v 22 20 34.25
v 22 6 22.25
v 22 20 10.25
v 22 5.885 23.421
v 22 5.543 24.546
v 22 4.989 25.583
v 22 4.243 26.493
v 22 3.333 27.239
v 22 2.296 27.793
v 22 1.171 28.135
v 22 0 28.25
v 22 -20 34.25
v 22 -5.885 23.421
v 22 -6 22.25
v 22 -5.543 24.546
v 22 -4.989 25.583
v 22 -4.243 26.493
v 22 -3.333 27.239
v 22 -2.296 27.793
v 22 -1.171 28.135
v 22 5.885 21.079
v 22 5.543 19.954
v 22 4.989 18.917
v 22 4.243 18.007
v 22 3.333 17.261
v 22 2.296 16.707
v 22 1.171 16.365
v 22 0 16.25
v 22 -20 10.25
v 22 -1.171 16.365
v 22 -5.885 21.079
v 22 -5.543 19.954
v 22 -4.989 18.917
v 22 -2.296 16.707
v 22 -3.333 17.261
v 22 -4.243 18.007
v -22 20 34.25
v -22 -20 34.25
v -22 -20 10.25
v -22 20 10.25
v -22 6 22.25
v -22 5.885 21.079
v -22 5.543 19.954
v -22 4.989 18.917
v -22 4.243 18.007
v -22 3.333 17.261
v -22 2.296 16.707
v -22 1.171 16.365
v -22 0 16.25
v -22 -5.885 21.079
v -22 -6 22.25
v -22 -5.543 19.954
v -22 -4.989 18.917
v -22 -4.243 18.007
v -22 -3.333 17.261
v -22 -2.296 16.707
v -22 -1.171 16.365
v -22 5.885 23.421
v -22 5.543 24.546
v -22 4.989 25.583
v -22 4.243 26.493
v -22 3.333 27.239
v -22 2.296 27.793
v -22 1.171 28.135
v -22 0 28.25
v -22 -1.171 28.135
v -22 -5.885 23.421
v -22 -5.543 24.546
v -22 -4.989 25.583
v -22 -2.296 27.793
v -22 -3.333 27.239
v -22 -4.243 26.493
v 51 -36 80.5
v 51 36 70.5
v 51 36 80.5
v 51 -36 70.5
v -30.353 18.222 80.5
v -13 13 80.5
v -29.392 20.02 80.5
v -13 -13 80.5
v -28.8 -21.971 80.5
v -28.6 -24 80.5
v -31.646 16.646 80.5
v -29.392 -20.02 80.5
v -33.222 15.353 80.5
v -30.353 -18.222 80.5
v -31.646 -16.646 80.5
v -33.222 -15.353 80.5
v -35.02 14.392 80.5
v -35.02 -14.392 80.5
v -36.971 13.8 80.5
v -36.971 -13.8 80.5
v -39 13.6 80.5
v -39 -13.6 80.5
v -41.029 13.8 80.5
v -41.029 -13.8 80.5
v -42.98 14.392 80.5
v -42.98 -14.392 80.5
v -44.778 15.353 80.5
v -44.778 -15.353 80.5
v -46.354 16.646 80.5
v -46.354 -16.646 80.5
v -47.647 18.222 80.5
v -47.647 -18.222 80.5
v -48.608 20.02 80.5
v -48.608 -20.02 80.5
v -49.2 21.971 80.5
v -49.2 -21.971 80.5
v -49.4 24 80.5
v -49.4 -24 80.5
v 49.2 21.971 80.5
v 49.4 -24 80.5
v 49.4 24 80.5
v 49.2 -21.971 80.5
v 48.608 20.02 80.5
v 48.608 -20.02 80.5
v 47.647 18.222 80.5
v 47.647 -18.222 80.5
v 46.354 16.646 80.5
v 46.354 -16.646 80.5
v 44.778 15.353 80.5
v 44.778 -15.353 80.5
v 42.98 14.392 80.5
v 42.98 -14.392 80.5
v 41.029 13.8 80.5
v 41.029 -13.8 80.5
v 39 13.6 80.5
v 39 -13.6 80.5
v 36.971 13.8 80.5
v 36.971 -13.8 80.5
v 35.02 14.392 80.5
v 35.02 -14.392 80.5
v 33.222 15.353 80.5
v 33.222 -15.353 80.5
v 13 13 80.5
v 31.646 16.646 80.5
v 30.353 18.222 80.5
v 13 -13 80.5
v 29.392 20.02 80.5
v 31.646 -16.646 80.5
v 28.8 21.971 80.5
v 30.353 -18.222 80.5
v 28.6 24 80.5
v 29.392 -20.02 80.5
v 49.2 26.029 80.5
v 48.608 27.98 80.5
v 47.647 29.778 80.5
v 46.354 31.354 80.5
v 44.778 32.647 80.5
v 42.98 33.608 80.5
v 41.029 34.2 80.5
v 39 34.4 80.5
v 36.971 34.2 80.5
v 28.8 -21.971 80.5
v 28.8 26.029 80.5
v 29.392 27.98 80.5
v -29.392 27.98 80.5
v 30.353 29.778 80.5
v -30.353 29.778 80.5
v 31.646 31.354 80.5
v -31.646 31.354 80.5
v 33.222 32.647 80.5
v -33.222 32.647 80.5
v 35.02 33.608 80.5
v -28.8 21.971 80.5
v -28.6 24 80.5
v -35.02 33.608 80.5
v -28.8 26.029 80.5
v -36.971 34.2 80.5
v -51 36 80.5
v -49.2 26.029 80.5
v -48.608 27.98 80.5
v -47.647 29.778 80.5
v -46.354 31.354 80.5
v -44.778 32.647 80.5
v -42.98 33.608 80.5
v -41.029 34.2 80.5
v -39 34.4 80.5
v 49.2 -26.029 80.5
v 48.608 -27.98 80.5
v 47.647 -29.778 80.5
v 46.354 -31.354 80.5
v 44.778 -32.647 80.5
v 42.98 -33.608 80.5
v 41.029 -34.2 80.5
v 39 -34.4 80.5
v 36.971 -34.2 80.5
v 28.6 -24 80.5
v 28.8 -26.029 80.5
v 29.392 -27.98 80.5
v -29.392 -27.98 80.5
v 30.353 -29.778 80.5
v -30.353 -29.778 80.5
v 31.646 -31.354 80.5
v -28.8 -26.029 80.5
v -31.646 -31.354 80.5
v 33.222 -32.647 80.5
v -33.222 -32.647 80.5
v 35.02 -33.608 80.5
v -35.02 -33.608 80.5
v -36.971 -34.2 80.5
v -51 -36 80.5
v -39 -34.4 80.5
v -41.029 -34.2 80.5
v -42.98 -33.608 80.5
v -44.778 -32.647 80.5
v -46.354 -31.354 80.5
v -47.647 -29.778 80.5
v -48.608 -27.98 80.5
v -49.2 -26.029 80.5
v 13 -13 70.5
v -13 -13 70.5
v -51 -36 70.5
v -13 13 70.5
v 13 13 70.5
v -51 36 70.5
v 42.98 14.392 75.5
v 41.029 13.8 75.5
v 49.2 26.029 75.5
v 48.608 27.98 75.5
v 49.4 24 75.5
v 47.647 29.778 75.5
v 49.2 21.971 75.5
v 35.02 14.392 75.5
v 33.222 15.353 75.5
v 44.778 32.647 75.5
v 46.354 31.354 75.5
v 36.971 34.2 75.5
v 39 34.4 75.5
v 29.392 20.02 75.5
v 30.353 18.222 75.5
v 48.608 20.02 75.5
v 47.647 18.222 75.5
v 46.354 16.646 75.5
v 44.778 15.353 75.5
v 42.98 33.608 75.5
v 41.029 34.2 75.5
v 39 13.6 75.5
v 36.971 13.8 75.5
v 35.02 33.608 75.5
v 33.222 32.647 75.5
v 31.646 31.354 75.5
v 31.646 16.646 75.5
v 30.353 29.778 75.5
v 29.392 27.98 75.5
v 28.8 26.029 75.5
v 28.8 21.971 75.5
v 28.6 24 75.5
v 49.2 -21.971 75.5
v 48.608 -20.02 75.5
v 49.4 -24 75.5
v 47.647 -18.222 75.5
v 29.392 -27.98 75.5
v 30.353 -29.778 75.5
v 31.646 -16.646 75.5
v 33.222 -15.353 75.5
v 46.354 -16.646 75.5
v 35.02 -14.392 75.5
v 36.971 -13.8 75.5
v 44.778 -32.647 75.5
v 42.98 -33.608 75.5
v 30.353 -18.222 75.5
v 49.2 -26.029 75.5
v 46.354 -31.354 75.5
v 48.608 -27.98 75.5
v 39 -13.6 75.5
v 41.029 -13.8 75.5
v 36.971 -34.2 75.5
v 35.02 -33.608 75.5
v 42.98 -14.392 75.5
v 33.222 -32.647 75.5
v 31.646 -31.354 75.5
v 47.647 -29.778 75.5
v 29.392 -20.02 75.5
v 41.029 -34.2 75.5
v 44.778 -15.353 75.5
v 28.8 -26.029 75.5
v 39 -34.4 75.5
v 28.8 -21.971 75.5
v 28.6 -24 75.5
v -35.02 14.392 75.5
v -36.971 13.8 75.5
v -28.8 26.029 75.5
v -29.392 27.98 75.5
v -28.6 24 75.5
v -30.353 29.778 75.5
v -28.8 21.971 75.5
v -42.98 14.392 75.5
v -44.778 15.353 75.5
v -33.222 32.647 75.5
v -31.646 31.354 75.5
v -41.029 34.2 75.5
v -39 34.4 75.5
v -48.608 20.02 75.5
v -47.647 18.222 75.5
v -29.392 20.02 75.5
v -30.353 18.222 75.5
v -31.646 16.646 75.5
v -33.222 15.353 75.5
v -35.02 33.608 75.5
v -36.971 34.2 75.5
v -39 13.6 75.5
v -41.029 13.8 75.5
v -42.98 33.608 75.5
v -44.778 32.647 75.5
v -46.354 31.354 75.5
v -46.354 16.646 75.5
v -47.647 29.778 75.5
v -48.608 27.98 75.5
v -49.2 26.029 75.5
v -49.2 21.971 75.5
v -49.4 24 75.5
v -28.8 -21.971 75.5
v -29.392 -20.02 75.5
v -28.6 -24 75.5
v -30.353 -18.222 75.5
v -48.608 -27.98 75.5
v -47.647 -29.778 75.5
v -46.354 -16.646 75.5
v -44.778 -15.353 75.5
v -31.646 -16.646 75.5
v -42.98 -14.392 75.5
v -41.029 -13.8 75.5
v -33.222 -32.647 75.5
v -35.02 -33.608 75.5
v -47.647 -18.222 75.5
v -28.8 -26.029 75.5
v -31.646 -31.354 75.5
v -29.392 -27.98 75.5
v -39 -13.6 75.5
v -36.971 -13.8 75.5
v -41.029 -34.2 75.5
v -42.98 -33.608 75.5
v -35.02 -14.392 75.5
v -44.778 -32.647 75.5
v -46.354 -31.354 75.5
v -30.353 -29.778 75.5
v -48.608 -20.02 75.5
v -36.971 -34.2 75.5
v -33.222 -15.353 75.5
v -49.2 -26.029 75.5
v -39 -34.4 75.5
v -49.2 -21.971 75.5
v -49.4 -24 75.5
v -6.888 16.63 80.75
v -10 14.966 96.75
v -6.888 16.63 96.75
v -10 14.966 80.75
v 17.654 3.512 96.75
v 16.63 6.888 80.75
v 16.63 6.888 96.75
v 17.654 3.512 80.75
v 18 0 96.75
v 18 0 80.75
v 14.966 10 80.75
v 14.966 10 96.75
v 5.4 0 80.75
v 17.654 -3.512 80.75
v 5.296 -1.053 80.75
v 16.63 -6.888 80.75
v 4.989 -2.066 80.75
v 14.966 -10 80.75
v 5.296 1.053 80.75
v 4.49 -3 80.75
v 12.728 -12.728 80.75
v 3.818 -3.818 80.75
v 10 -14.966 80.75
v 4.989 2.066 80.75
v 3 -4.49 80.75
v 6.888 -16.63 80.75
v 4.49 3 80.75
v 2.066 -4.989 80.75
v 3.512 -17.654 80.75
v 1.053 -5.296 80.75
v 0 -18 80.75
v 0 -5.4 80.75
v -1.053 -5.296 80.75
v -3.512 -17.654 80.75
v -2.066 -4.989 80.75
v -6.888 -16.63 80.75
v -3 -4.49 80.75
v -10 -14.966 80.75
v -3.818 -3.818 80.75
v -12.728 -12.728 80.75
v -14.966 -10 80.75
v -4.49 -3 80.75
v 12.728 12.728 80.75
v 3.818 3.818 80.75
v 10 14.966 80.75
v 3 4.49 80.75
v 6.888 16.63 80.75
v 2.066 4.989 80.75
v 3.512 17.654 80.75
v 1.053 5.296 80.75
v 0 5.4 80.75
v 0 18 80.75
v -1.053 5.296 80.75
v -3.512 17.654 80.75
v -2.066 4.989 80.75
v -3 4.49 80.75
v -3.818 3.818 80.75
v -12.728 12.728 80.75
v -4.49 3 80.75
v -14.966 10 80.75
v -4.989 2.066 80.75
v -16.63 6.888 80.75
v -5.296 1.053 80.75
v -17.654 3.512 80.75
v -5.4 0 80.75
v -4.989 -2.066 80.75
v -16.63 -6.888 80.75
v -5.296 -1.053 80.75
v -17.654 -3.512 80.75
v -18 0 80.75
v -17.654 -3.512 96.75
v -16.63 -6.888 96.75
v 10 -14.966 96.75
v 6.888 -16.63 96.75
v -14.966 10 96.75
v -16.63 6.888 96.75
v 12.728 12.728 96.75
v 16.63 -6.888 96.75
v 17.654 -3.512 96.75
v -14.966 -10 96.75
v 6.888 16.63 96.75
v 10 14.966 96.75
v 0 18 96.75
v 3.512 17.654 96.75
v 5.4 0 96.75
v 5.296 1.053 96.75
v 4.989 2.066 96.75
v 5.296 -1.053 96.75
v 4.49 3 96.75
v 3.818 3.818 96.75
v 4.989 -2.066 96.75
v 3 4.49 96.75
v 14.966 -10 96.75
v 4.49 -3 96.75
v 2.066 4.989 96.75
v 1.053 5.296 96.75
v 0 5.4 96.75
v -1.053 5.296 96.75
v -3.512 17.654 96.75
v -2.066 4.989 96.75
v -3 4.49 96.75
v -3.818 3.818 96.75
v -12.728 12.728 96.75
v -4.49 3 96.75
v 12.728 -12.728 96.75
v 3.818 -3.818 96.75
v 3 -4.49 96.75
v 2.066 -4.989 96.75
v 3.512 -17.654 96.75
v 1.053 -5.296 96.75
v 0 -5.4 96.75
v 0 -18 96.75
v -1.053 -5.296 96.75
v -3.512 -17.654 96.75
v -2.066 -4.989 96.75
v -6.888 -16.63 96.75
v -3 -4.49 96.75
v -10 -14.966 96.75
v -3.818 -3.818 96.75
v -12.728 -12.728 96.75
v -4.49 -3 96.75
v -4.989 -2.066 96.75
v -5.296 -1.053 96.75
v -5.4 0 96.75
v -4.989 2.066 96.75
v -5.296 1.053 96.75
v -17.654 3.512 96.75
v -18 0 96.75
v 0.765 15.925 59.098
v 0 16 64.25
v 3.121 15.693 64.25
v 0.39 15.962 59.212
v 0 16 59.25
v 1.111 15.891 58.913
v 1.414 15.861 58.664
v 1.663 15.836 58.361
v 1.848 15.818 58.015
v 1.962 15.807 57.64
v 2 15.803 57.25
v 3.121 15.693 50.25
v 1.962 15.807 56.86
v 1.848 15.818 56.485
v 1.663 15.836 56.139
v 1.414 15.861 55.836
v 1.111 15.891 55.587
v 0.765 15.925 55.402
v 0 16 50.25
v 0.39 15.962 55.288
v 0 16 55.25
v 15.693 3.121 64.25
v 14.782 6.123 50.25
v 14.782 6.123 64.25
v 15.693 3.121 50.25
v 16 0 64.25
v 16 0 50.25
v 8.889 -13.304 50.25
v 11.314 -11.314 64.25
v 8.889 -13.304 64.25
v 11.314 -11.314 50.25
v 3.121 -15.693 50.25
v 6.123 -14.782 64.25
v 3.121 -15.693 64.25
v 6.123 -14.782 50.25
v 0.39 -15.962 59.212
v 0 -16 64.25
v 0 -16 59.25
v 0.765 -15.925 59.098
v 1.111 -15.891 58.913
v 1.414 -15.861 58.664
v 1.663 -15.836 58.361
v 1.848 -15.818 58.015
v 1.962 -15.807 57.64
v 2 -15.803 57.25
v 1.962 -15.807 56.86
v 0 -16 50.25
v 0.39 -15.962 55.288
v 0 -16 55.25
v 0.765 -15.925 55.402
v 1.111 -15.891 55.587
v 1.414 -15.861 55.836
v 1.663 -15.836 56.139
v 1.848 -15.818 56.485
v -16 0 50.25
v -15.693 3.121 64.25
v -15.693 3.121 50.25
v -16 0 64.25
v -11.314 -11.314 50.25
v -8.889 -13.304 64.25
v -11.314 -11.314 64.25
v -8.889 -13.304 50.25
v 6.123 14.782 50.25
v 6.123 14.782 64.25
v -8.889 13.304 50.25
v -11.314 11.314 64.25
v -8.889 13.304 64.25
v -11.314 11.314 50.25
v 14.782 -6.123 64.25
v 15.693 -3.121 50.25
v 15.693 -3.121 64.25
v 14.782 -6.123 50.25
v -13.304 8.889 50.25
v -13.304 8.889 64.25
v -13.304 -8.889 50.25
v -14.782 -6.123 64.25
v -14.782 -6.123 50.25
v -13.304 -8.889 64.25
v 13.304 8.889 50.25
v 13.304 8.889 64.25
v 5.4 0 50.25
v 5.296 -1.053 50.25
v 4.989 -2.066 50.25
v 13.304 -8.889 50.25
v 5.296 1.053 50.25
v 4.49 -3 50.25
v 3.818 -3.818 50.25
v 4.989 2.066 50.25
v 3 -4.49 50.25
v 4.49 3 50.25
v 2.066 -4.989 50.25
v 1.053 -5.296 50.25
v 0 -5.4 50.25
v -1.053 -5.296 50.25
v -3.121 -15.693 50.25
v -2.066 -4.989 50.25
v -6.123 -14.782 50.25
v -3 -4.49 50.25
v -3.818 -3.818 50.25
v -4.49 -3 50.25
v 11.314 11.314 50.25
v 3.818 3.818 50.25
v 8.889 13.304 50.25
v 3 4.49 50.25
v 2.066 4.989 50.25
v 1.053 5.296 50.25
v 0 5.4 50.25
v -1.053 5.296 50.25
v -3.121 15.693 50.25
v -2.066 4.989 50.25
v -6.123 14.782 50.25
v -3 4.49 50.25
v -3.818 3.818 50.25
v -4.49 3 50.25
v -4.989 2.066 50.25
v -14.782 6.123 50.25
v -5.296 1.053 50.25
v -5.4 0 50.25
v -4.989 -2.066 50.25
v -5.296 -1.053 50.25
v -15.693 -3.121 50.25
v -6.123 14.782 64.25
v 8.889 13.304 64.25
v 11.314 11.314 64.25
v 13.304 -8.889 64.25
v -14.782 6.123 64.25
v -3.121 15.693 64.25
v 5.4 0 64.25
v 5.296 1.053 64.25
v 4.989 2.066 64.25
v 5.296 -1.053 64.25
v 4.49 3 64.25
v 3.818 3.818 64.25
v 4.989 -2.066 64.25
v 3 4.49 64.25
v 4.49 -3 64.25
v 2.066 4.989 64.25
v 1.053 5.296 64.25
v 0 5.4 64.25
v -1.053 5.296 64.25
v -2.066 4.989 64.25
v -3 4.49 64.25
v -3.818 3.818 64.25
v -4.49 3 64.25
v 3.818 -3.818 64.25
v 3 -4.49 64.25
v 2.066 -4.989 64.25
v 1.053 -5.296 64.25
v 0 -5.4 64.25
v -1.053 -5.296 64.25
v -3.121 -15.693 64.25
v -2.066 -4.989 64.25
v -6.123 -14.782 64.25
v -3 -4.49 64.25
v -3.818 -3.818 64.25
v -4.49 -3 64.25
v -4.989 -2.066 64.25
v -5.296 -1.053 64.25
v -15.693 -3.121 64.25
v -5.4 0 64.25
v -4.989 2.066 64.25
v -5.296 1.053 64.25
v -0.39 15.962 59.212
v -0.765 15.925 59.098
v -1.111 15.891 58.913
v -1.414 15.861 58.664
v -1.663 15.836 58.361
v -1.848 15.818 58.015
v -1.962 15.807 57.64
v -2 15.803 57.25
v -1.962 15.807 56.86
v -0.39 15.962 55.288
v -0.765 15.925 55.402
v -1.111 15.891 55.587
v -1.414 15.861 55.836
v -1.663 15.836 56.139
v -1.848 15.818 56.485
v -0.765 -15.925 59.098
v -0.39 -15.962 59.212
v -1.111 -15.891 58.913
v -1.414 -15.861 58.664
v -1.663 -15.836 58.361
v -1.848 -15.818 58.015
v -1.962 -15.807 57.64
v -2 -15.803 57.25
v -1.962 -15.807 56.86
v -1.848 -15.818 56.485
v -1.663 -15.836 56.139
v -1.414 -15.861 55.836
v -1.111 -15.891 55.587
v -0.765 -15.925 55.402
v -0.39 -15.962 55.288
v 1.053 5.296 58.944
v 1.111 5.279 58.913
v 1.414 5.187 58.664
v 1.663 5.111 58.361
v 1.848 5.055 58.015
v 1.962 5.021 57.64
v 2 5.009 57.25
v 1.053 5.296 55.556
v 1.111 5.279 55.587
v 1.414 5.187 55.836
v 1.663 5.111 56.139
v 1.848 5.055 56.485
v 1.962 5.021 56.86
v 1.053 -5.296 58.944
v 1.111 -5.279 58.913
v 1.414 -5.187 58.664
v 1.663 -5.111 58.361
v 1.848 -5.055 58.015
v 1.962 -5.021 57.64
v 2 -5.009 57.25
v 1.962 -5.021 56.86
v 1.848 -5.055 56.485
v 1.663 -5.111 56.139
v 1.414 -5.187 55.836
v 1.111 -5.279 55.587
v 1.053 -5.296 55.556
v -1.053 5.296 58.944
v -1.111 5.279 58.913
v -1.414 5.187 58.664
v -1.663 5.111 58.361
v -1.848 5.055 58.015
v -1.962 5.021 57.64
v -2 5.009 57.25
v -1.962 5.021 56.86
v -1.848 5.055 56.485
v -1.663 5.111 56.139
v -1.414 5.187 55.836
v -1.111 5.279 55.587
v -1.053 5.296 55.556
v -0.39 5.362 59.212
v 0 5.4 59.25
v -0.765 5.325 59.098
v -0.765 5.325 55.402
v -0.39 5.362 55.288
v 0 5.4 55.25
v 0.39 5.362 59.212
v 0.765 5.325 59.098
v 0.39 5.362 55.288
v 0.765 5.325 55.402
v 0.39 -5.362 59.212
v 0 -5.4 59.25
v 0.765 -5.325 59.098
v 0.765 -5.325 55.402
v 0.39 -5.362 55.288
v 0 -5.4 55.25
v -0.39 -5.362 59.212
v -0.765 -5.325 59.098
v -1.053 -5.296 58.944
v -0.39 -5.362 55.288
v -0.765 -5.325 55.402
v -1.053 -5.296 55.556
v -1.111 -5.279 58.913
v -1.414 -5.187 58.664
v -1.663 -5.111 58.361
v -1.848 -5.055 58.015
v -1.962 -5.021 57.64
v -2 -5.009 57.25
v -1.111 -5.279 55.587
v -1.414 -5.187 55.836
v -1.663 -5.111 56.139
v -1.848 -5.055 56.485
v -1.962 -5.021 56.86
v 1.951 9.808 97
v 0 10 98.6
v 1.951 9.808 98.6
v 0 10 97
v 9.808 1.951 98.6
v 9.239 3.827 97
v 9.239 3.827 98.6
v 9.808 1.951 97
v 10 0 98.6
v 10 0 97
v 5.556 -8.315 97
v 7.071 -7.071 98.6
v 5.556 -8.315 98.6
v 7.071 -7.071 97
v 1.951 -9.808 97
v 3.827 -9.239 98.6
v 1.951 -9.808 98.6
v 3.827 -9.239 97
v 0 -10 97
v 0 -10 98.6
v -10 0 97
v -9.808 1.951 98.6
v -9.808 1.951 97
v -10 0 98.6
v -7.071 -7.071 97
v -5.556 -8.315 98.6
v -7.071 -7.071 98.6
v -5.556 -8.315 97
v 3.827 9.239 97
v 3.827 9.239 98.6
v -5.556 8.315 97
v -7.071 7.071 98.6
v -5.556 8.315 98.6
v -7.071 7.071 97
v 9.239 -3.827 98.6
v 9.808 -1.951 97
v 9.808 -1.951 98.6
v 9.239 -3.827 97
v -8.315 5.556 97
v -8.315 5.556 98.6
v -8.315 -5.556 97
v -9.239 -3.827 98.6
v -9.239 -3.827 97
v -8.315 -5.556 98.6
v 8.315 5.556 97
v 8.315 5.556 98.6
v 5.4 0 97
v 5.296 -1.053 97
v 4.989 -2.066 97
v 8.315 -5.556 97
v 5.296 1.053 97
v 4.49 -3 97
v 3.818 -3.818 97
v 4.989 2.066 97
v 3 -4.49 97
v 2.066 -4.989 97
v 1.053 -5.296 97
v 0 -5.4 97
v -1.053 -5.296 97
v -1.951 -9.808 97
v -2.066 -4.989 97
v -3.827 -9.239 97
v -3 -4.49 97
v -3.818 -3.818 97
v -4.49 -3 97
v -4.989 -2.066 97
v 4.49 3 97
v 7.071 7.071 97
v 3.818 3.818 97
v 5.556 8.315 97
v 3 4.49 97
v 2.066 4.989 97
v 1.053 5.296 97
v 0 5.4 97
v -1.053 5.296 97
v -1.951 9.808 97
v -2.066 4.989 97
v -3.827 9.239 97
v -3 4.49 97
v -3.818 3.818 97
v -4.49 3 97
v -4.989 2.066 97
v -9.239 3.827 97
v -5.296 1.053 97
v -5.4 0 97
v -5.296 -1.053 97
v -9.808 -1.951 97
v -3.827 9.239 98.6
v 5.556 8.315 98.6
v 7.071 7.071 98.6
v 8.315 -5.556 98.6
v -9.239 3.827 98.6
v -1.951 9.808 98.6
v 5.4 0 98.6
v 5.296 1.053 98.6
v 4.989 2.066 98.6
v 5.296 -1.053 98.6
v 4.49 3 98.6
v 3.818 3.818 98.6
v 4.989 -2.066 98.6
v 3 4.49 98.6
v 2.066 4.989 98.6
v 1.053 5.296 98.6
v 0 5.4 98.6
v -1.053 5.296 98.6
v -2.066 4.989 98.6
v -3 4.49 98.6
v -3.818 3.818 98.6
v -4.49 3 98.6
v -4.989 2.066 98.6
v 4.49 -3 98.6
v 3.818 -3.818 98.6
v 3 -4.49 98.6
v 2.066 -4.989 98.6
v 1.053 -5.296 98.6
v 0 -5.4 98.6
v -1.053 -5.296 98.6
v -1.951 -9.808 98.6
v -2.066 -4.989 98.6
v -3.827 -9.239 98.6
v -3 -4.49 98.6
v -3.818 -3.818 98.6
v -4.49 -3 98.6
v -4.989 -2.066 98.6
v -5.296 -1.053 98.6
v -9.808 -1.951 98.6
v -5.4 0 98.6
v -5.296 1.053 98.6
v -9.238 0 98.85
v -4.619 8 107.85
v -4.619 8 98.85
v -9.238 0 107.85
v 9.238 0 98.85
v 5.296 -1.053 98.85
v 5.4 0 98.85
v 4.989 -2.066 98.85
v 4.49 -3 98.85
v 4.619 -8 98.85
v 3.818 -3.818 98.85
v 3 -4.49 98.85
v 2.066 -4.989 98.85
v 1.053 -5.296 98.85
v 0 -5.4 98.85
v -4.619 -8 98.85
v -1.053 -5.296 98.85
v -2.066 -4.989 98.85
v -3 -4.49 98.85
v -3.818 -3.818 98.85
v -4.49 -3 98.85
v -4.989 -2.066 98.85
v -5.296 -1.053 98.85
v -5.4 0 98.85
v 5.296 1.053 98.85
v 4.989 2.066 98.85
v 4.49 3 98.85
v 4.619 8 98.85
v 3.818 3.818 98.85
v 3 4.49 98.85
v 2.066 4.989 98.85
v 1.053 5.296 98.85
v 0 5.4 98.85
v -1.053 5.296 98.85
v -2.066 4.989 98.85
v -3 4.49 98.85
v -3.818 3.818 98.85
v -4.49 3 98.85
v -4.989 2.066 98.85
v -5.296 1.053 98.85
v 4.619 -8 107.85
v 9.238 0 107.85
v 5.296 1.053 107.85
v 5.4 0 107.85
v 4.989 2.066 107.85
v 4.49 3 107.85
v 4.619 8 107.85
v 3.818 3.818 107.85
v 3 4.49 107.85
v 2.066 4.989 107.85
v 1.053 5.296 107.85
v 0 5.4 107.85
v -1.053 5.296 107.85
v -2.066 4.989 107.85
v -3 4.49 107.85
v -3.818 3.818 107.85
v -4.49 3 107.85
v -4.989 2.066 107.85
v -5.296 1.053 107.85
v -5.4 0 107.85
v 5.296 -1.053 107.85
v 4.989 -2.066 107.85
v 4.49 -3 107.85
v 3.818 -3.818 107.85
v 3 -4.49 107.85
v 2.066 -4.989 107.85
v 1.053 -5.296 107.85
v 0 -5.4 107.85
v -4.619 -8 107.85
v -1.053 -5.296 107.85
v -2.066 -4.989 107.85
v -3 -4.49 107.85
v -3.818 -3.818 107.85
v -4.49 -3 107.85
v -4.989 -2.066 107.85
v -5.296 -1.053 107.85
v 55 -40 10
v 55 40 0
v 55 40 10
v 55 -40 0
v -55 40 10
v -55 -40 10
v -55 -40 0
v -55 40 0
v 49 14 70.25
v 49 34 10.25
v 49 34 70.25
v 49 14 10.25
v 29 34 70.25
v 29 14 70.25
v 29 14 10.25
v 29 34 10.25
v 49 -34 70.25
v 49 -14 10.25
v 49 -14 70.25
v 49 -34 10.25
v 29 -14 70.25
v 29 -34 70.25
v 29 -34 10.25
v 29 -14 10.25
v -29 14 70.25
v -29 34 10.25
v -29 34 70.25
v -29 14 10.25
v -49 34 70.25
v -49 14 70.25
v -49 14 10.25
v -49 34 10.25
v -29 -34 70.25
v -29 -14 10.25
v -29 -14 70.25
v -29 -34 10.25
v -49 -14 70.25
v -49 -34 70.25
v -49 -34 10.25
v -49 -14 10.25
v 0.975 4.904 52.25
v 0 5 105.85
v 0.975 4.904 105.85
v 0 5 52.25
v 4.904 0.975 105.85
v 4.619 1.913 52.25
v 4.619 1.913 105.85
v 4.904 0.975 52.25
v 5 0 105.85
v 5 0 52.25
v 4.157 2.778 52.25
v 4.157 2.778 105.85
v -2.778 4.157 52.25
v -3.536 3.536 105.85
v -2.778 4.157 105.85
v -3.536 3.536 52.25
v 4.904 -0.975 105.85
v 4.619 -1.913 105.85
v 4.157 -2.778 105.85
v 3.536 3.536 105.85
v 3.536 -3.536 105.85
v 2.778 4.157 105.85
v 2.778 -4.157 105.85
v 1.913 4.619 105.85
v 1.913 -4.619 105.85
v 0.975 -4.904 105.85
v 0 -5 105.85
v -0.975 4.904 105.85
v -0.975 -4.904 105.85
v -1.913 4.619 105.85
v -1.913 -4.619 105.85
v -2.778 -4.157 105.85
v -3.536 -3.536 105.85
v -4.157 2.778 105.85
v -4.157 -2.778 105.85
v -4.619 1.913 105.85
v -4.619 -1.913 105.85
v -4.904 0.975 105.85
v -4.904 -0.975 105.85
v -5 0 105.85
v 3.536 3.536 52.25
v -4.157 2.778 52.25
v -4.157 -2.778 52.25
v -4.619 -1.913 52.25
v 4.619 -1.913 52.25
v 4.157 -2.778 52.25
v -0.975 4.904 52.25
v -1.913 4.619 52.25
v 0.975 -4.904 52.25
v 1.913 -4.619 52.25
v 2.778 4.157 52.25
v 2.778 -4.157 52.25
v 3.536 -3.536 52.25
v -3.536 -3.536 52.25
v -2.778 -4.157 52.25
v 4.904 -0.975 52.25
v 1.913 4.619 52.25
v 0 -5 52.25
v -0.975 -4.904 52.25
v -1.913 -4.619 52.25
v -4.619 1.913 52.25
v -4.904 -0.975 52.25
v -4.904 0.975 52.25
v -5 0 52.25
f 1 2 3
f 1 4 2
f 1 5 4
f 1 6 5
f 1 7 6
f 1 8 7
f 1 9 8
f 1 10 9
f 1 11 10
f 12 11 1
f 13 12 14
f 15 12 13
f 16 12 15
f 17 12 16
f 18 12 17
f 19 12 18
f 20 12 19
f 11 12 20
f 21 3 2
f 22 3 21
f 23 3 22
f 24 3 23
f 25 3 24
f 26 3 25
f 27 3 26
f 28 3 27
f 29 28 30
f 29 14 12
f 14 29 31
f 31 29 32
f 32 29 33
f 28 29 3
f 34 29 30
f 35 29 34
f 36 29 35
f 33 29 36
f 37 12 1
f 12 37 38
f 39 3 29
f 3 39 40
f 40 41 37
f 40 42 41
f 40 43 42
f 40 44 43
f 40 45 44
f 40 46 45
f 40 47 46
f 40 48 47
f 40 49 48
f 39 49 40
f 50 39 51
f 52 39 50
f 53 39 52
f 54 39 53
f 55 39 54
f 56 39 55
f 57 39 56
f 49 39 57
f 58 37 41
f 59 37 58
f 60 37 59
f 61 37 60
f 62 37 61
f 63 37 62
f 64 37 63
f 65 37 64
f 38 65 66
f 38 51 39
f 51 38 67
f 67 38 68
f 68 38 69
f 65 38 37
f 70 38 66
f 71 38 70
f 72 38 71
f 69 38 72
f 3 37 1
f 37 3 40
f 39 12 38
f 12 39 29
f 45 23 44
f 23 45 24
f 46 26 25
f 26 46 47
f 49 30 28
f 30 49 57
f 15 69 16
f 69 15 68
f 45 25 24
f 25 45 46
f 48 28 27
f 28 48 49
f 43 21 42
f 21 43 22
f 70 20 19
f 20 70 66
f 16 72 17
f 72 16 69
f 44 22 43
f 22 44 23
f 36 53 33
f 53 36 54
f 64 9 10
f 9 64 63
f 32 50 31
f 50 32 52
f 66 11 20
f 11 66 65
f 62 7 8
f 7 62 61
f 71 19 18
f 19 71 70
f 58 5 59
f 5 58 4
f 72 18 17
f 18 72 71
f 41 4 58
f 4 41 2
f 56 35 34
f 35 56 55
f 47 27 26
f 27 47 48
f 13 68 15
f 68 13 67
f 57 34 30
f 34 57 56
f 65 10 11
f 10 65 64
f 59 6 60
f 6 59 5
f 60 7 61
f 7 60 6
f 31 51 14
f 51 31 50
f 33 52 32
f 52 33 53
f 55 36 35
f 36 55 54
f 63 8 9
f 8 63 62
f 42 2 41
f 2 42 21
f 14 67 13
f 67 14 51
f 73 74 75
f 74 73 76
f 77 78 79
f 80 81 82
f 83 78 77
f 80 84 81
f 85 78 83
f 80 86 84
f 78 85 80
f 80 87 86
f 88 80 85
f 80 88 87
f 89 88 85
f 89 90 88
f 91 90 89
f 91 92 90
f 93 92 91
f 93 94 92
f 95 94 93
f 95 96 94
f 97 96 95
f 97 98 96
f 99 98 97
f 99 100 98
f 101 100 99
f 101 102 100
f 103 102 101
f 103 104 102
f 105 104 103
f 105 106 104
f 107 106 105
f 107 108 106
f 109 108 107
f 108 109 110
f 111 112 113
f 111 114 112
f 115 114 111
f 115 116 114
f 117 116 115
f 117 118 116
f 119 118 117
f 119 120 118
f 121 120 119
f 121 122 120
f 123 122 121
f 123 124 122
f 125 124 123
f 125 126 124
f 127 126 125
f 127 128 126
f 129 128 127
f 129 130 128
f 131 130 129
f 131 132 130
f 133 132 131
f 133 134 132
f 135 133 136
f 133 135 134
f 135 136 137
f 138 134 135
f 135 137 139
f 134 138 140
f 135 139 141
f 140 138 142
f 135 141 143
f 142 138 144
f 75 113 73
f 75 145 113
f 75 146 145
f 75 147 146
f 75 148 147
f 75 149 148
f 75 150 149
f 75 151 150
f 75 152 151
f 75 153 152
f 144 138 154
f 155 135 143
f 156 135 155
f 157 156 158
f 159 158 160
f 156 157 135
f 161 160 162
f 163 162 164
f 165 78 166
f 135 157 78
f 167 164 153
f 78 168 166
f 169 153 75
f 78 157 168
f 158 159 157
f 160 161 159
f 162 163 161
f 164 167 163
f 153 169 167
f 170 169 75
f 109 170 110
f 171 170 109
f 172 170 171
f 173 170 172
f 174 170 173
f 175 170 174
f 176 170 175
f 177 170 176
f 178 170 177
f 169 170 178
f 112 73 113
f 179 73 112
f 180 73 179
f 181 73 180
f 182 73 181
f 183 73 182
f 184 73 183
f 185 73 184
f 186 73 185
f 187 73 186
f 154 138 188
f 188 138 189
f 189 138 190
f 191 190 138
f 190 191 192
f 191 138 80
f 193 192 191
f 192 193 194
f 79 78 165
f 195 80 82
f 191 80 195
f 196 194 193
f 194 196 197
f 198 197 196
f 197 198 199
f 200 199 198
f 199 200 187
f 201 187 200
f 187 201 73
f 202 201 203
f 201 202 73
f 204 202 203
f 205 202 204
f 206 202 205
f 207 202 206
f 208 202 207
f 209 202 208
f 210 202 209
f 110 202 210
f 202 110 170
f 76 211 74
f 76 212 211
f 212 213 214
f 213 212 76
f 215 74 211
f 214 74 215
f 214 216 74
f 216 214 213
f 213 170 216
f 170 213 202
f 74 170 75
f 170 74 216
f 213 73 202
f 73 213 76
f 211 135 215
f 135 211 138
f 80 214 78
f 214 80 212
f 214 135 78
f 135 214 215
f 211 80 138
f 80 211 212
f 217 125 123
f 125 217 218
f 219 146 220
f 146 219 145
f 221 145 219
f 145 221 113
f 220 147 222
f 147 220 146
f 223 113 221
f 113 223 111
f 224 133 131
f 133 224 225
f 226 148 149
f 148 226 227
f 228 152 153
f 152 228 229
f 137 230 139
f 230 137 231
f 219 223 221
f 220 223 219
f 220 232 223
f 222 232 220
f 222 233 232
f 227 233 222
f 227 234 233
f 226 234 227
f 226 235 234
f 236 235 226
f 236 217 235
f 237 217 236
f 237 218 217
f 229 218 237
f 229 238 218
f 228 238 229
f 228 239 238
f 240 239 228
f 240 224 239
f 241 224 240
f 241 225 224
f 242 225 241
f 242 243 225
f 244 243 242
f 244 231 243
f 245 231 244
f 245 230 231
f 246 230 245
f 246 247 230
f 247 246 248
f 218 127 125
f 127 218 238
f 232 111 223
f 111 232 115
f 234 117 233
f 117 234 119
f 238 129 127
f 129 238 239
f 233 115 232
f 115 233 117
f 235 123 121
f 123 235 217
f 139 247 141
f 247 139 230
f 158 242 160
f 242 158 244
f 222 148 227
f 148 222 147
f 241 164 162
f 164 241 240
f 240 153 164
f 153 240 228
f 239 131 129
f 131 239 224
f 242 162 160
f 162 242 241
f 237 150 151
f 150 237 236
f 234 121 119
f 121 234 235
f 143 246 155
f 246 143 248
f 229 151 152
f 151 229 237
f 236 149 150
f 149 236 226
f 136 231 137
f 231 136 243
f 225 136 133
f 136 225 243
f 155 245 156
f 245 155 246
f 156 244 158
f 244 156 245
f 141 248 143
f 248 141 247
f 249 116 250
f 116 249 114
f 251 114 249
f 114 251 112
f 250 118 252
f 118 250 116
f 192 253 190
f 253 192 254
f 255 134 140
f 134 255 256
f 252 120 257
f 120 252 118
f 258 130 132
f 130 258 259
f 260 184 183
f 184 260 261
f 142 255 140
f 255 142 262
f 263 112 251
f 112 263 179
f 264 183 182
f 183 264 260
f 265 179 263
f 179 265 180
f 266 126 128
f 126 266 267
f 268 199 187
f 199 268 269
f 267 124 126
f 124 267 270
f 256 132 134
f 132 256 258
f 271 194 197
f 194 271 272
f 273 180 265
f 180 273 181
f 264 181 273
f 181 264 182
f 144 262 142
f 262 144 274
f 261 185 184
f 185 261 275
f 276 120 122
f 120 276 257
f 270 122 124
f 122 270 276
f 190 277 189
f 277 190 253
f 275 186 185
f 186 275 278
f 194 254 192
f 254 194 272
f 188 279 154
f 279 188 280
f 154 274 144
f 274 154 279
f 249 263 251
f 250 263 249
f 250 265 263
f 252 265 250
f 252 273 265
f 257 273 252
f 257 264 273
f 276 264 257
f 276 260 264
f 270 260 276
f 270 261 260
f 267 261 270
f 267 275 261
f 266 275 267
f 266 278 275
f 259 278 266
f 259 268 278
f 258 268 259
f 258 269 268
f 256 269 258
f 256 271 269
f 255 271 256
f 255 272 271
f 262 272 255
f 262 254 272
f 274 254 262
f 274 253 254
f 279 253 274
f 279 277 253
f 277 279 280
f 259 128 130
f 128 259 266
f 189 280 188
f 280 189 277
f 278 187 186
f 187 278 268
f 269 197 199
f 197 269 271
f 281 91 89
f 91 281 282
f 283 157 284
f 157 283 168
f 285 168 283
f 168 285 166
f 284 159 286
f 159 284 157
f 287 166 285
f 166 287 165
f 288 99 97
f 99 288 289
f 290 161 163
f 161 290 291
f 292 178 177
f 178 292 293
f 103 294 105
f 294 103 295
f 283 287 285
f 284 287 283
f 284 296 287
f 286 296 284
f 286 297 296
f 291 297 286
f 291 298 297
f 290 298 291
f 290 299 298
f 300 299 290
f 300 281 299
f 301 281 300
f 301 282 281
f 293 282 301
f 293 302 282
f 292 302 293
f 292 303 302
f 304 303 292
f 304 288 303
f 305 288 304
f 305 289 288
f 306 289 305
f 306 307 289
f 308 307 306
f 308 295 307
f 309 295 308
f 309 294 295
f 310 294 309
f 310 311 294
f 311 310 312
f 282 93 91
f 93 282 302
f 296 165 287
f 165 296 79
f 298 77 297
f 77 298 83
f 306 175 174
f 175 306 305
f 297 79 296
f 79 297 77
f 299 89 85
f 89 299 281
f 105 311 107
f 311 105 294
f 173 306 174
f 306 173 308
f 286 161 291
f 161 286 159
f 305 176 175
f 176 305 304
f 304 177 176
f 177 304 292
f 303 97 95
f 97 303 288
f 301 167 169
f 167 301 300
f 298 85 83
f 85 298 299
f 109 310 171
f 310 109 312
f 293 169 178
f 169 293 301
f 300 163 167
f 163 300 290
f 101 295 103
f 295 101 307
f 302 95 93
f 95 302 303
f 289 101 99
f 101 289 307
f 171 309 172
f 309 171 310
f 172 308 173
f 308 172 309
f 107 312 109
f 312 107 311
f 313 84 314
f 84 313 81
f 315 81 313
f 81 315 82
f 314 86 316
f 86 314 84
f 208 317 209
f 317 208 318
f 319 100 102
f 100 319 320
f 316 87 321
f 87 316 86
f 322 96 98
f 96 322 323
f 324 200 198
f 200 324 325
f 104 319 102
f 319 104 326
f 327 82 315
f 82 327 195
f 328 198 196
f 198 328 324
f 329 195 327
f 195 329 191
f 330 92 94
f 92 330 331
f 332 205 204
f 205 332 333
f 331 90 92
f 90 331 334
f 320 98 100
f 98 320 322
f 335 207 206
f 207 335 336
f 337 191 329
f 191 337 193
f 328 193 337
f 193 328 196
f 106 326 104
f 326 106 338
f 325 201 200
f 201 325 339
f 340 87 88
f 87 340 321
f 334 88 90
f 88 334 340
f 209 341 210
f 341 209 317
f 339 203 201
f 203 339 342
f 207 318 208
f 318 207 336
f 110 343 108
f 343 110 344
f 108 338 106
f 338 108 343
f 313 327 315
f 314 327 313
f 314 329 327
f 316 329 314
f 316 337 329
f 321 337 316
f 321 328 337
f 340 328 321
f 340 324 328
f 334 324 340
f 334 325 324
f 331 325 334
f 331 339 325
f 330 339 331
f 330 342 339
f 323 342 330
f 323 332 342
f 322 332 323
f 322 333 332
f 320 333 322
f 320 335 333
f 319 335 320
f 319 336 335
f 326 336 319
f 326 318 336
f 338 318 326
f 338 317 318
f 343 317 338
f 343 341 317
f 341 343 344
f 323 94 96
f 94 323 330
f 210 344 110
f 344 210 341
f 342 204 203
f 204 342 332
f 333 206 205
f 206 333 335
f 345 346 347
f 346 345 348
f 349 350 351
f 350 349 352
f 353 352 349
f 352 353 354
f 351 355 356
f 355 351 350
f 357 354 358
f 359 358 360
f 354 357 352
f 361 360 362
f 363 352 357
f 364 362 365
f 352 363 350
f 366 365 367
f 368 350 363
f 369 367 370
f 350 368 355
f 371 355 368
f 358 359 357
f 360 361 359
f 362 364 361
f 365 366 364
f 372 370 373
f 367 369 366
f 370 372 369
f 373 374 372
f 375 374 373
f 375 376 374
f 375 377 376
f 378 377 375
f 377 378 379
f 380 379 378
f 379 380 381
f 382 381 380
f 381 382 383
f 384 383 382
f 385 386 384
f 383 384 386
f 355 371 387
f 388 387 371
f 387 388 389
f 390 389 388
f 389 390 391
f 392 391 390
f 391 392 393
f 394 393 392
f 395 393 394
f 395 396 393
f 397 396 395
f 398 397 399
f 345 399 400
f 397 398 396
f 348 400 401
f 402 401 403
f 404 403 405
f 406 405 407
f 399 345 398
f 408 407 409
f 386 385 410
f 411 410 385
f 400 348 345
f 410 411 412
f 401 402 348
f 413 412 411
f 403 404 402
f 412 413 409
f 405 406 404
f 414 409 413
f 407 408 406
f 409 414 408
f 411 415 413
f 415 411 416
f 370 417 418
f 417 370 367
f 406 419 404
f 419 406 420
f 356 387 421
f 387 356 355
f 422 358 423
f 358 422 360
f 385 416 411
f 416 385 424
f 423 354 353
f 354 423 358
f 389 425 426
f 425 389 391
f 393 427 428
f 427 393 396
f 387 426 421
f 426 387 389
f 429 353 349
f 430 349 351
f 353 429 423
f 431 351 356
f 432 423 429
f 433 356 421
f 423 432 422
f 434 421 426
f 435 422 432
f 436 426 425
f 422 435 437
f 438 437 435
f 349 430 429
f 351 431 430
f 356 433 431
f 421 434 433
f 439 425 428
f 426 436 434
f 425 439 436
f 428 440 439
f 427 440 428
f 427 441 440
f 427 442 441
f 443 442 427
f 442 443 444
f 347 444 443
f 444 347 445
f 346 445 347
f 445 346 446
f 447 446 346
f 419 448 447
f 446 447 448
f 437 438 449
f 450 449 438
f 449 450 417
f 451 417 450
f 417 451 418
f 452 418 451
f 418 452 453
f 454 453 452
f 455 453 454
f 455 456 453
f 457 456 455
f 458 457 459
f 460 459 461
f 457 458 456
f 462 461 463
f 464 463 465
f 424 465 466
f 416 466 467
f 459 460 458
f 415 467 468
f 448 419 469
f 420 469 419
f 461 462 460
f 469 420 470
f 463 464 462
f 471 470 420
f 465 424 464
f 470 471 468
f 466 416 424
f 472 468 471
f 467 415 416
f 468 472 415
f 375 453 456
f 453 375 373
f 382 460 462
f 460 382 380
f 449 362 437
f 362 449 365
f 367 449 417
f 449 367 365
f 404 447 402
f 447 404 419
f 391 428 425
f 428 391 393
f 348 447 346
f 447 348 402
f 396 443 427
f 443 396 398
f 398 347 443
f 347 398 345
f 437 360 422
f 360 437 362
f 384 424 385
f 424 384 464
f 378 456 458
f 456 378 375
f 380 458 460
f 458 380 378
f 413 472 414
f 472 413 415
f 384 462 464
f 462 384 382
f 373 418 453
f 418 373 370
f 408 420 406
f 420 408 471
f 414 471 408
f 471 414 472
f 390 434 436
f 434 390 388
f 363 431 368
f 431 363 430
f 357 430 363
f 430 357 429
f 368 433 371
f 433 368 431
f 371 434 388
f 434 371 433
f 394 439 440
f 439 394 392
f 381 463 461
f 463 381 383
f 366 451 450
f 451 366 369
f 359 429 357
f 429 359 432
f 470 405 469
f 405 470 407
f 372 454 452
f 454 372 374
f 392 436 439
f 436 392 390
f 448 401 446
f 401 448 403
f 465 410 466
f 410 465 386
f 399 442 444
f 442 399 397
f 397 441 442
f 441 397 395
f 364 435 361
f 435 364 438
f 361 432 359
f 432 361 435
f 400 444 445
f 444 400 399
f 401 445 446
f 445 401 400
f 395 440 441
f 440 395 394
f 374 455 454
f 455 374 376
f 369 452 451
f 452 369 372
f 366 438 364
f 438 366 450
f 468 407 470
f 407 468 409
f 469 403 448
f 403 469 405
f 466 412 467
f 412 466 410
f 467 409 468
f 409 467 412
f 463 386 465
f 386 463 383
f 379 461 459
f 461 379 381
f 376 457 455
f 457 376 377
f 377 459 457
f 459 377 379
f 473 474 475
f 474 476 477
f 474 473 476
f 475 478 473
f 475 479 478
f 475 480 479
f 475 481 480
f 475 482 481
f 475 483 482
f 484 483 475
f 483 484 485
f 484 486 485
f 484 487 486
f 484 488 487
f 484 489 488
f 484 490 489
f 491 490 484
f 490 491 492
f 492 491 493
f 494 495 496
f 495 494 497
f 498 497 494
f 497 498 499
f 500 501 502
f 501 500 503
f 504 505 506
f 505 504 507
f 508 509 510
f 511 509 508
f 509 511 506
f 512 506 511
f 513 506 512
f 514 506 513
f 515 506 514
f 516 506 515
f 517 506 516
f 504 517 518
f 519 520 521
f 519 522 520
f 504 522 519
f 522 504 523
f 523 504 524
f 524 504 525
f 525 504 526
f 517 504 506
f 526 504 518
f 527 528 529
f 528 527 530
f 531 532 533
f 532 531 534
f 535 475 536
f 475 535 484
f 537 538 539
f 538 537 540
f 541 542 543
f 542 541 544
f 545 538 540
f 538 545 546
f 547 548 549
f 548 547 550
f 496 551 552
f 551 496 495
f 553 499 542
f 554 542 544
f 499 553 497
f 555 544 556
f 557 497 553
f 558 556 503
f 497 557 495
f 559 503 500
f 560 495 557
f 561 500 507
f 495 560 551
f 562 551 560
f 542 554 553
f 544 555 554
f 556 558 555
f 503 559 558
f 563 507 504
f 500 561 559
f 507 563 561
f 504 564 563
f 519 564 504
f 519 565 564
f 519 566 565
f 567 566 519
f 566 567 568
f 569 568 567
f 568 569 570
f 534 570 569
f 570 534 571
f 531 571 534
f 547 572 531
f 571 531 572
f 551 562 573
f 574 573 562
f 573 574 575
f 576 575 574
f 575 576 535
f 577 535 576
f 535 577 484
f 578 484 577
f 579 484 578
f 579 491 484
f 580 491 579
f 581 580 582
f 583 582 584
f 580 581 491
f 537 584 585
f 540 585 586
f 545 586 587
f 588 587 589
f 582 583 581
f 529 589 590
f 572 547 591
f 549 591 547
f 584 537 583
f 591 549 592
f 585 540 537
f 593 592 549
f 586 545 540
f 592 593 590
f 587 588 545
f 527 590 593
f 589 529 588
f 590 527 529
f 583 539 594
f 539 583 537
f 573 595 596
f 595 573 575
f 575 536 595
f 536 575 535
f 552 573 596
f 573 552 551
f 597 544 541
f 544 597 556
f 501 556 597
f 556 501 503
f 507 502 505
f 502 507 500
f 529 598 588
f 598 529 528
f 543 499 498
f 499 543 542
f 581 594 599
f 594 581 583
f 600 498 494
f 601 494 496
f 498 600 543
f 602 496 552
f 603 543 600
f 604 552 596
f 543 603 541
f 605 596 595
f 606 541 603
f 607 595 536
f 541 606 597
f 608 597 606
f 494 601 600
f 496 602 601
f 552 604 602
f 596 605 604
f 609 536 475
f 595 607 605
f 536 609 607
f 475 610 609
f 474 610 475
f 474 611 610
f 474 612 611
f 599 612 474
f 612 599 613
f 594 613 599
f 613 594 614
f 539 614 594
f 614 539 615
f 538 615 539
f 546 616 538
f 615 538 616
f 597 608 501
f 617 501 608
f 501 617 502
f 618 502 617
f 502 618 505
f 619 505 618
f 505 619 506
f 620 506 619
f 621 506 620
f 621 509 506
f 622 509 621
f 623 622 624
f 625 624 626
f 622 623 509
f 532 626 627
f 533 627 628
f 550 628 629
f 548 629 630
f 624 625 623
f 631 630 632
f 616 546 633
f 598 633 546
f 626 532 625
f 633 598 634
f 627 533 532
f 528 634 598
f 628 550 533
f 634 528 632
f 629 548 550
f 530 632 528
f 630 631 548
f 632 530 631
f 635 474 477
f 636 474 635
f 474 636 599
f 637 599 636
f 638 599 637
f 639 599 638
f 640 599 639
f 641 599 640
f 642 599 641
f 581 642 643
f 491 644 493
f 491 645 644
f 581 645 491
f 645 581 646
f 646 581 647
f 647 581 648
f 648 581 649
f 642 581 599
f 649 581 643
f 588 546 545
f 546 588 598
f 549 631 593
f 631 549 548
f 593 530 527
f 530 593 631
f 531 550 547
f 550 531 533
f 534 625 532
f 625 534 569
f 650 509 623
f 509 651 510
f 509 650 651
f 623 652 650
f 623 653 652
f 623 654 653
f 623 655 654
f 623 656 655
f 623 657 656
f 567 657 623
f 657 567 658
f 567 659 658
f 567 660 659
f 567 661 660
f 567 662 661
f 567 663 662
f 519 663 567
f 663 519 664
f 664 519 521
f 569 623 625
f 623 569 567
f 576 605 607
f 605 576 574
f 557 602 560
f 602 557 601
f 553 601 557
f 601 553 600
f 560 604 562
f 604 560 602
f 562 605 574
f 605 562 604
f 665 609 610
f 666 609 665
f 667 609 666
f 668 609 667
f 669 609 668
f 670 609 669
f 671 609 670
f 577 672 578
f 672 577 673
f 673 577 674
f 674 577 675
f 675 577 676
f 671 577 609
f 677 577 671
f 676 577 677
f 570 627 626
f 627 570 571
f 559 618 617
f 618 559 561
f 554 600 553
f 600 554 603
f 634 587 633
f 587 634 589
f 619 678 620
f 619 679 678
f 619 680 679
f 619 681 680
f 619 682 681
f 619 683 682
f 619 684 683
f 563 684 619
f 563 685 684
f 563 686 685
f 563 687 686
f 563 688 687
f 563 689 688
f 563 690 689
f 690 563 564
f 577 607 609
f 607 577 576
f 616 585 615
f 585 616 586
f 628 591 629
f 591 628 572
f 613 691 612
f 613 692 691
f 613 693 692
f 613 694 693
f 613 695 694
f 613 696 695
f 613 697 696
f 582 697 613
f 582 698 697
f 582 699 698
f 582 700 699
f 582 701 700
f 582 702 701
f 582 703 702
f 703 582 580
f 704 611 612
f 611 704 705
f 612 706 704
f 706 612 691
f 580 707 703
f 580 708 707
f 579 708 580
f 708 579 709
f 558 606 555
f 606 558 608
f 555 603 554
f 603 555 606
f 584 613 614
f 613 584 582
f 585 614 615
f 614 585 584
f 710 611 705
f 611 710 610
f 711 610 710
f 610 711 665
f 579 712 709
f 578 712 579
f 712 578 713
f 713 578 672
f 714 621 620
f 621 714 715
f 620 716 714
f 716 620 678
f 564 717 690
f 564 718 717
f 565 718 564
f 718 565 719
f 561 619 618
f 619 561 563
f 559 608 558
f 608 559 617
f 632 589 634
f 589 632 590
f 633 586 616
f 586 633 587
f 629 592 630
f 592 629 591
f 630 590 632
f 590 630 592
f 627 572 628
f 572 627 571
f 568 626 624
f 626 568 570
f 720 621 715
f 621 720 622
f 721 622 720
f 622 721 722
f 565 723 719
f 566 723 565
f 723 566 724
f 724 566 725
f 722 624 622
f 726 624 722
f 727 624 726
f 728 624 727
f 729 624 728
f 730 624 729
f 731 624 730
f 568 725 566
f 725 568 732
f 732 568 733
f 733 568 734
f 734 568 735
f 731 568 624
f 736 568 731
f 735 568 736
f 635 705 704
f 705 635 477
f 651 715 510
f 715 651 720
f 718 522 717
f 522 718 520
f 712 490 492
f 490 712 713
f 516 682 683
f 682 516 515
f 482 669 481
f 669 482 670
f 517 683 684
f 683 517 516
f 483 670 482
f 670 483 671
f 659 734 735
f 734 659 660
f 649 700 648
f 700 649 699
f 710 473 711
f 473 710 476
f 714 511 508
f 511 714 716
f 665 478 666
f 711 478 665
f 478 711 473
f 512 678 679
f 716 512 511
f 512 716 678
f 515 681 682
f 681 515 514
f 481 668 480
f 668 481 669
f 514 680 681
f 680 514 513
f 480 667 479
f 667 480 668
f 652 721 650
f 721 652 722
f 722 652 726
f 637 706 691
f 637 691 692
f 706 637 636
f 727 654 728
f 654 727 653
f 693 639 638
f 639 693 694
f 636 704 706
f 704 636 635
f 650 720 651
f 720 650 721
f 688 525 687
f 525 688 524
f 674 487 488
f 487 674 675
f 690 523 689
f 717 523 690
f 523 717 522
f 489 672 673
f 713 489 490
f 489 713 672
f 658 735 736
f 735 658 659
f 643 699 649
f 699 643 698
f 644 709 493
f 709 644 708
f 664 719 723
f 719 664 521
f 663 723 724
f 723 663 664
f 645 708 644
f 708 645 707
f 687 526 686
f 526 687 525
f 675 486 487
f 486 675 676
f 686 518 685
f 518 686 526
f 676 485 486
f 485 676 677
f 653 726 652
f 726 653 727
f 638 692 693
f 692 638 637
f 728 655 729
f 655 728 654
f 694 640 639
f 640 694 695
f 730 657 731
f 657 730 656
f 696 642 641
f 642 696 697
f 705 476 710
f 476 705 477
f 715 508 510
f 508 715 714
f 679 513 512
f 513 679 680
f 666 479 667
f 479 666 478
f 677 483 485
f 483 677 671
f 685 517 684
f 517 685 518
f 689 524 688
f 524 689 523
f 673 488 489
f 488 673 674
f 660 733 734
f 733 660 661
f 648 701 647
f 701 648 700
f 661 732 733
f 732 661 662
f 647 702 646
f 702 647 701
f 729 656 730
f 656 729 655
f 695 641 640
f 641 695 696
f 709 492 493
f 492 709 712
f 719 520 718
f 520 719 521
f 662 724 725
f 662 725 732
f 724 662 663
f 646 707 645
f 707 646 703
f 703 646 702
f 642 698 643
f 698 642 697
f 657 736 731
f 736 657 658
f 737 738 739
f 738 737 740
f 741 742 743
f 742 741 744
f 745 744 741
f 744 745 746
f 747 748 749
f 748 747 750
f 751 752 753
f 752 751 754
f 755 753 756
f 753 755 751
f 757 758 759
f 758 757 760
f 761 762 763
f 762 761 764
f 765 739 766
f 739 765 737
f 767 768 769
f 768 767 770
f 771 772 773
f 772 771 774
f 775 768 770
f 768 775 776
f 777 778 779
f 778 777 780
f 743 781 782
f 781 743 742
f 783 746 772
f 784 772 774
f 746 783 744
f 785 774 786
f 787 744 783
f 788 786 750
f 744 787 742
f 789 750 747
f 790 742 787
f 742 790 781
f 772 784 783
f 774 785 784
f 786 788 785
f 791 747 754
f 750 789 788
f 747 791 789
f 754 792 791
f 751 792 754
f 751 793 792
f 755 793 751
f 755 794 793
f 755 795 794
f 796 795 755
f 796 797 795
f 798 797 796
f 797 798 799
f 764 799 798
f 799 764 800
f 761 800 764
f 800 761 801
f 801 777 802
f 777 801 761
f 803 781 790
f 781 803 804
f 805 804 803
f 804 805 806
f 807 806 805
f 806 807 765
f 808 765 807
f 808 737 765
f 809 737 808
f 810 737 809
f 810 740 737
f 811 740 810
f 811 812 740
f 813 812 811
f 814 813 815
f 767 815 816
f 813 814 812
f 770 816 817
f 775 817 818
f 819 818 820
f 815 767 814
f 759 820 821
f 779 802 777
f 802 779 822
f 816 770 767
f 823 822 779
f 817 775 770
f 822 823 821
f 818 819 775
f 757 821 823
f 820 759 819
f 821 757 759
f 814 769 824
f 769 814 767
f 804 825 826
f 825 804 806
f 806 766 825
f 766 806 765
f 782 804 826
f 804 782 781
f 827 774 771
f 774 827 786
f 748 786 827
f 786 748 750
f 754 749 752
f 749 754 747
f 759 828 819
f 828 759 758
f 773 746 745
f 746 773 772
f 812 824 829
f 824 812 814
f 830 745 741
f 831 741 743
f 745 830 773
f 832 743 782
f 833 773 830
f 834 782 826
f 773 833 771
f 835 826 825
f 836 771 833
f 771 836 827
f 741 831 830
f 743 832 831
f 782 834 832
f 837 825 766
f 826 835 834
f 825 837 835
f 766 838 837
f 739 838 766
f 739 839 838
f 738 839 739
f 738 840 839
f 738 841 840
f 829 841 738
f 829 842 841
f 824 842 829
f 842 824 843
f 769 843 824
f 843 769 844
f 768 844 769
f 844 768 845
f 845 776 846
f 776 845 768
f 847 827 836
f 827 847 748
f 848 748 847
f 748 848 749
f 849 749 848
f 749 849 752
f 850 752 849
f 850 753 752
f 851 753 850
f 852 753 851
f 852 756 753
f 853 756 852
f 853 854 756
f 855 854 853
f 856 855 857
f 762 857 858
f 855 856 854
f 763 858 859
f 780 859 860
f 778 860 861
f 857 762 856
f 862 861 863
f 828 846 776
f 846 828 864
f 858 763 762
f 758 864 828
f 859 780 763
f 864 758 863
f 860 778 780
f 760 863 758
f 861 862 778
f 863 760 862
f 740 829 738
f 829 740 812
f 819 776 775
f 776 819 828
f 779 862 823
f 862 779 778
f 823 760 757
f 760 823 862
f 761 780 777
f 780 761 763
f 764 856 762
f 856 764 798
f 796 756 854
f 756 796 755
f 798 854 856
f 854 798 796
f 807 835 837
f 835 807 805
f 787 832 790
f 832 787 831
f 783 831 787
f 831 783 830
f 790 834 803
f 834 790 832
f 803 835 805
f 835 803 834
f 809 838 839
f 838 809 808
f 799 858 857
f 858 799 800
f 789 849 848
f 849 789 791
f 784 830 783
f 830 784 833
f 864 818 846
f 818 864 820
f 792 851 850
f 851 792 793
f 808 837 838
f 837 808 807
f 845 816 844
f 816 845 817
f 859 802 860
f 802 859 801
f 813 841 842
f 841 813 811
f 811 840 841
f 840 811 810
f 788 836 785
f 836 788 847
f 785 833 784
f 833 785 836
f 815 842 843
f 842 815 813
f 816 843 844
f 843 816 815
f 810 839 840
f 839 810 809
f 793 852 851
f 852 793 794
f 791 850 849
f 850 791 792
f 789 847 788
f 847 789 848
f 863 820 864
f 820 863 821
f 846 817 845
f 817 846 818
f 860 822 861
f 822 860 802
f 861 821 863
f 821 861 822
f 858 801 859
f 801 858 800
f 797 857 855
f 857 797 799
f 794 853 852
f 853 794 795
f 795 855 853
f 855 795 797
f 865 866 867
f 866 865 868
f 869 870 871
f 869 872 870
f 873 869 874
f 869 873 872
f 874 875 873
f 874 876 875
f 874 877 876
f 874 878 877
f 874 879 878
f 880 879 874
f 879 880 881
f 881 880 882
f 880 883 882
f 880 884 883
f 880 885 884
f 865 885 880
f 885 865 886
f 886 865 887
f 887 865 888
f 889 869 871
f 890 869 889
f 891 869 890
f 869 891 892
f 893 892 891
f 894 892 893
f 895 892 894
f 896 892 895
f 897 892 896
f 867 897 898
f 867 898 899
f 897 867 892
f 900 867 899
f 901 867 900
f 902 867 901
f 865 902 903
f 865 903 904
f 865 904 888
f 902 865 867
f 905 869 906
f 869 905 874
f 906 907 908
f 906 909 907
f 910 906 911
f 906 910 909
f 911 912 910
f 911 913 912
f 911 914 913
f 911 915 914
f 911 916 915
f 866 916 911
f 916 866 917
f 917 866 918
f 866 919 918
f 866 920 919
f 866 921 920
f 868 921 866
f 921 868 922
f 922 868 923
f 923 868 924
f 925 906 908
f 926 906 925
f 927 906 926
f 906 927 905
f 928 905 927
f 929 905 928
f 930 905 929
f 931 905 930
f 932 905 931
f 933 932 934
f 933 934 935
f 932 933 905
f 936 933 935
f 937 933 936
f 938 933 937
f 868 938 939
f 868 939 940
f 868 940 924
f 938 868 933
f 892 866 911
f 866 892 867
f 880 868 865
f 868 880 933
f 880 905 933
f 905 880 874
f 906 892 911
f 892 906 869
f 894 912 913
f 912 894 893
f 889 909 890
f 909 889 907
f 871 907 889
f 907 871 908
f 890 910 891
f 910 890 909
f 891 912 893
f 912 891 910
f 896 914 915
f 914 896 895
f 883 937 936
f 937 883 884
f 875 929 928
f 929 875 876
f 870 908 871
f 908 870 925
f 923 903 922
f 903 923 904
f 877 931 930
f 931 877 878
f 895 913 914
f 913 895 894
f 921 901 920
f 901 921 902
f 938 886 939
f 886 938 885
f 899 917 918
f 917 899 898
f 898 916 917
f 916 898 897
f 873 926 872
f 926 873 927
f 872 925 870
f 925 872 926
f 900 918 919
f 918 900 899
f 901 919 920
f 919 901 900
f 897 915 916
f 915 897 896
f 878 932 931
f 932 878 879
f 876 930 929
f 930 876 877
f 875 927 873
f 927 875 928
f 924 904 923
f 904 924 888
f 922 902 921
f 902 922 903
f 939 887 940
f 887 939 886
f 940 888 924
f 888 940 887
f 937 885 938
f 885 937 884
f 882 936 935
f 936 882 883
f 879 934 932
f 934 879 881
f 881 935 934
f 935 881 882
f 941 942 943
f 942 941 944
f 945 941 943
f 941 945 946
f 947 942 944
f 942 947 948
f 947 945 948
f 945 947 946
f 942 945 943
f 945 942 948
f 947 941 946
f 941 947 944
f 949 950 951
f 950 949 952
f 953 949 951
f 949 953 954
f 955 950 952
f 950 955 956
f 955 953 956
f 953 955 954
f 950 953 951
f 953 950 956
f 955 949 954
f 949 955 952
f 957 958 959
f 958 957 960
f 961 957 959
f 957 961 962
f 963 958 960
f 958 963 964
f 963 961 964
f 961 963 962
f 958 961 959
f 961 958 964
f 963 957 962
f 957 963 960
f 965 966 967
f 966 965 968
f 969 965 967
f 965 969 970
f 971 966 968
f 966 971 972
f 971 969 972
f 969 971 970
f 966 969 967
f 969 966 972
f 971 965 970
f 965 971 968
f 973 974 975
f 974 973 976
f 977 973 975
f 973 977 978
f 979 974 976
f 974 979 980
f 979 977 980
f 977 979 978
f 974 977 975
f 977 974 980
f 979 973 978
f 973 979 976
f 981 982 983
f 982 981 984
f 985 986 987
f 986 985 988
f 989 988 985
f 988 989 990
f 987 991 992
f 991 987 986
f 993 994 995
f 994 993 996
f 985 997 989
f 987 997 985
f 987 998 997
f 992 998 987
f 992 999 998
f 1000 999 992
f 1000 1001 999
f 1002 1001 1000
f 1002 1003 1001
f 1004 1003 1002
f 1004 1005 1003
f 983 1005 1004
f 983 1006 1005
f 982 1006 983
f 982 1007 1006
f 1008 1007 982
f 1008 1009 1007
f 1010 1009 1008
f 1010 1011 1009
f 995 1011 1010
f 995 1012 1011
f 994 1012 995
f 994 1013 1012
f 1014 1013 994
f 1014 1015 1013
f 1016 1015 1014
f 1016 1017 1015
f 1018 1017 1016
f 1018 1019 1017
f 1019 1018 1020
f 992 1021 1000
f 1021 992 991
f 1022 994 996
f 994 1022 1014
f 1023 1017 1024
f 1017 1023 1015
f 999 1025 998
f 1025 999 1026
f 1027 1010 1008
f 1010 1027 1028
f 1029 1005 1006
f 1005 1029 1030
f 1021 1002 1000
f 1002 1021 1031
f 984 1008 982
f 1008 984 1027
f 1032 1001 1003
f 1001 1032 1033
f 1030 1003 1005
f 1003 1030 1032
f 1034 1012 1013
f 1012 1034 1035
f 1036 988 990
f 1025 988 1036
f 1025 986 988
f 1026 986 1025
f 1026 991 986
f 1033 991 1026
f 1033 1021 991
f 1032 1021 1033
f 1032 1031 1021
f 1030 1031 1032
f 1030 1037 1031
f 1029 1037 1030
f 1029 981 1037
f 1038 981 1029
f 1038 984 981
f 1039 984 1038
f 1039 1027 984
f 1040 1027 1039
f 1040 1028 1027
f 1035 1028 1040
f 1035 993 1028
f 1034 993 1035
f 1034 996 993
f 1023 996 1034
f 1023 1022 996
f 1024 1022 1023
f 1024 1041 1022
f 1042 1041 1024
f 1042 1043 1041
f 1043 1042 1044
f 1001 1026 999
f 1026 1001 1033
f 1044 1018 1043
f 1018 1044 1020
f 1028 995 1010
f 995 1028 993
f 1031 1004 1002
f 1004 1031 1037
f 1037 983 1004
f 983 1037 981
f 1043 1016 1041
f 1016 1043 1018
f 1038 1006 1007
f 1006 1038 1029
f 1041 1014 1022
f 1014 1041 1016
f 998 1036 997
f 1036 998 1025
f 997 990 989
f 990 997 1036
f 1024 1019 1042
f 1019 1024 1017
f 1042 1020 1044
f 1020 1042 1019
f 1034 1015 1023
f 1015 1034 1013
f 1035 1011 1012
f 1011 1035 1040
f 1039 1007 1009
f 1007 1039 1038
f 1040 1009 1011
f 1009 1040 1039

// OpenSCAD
$fn = 32;

// ------------------------------------------------------------------------
// Arbor press fixture: screw d10, posts 60 mm, gap 16 mm
// Every part is its own module, assembly() places every instance.
// ------------------------------------------------------------------------

// --- part 1 ---
module press_bed() {
  difference() {
    translate([-55, -40, 0]) cube([110, 80, 10]);
  }
}

// --- part 2 ---
module anvil_block() {
  difference() {
    translate([-22, -20, 0]) cube([44, 40, 24]);
    translate([0, 0, 12]) rotate([0, 90, 0]) cylinder(h = 46, d = 12, center = true);
  }
}

// --- part 3 ---
module press_post_a() {
  translate([-10, -10, 0]) cube([20, 20, 60]);
}

// --- part 4 ---
module press_post_b() {
  translate([-10, -10, 0]) cube([20, 20, 60]);
}

// --- part 5 ---
module press_post_c() {
  translate([-10, -10, 0]) cube([20, 20, 60]);
}

// --- part 6 ---
module press_post_d() {
  translate([-10, -10, 0]) cube([20, 20, 60]);
}

// --- part 7 ---
module press_frame() {
  difference() {
    translate([-51, -36, 0]) cube([102, 72, 10]);
    translate([-13, -13, -1]) cube([26, 26, 12]);
    translate([39, 24, 5]) cylinder(h = 6, d = 20.8);
    translate([39, -24, 5]) cylinder(h = 6, d = 20.8);
    translate([-39, 24, 5]) cylinder(h = 6, d = 20.8);
    translate([-39, -24, 5]) cylinder(h = 6, d = 20.8);
  }
}

// --- part 8 ---
module guide_ring() {
  difference() {
      translate([0, 0, 0]) cylinder(h = 16, d = 36);
      translate([0, 0, -1]) cylinder(h = 18, d = 10.8);
    }
}

// --- part 9 ---
module press_screw() {
  translate([0, 0, -26.8]) cylinder(h = 53.6, d = 10);
}

// --- part 10 ---
module press_head() {
  difference() {
    cylinder(h = 14, d = 32);
    translate([0, 0, -1]) cylinder(h = 16, d = 10.8);
    translate([0, 0, 7]) rotate([90, 0, 0]) cylinder(h = 34, d = 4, center = true);
  }
}

// --- part 11 ---
module nut_washer() {
  difference() {
      translate([0, 0, 0]) cylinder(h = 1.6, d = 20);
      translate([0, 0, -1]) cylinder(h = 3.6, d = 10.8);
    }
}

// --- part 12 ---
module press_nut() {
  difference() {
    linear_extrude(height = 9) polygon(points = [[9.238, 0], [4.619, 8], [-4.619, 8], [-9.238, 0], [-4.619, -8], [4.619, -8]]);
    translate([0, 0, -1]) cylinder(h = 11, d = 10.8);
  }
}

// --- assembly ---
module assembly() {
  color([0.80, 0.24, 0.20]) translate([0, 0, 0]) rotate([0, 0, 0]) press_bed();
  color([0.20, 0.45, 0.75]) translate([0, 0, 10.25]) rotate([0, 0, 0]) anvil_block();
  color([0.25, 0.62, 0.32]) translate([39, 24, 10.25]) rotate([0, 0, 0]) press_post_a();
  color([0.92, 0.70, 0.18]) translate([39, -24, 10.25]) rotate([0, 0, 0]) press_post_b();
  color([0.58, 0.35, 0.70]) translate([-39, 24, 10.25]) rotate([0, 0, 0]) press_post_c();
  color([0.16, 0.66, 0.66]) translate([-39, -24, 10.25]) rotate([0, 0, 0]) press_post_d();
  color([0.85, 0.48, 0.18]) translate([0, 0, 70.5]) rotate([0, 0, 0]) press_frame();
  color([0.55, 0.60, 0.65]) translate([0, 0, 80.75]) rotate([0, 0, 0]) guide_ring();
  color([0.75, 0.30, 0.55]) translate([0, 0, 79.05]) rotate([0, 0, 0]) press_screw();
  color([0.42, 0.52, 0.28]) translate([0, 0, 50.25]) rotate([0, 0, 0]) press_head();
  color([0.80, 0.24, 0.20]) translate([0, 0, 97]) rotate([0, 0, 0]) nut_washer();
  color([0.20, 0.45, 0.75]) translate([0, 0, 98.85]) rotate([0, 0, 0]) press_nut();
}

assembly();
